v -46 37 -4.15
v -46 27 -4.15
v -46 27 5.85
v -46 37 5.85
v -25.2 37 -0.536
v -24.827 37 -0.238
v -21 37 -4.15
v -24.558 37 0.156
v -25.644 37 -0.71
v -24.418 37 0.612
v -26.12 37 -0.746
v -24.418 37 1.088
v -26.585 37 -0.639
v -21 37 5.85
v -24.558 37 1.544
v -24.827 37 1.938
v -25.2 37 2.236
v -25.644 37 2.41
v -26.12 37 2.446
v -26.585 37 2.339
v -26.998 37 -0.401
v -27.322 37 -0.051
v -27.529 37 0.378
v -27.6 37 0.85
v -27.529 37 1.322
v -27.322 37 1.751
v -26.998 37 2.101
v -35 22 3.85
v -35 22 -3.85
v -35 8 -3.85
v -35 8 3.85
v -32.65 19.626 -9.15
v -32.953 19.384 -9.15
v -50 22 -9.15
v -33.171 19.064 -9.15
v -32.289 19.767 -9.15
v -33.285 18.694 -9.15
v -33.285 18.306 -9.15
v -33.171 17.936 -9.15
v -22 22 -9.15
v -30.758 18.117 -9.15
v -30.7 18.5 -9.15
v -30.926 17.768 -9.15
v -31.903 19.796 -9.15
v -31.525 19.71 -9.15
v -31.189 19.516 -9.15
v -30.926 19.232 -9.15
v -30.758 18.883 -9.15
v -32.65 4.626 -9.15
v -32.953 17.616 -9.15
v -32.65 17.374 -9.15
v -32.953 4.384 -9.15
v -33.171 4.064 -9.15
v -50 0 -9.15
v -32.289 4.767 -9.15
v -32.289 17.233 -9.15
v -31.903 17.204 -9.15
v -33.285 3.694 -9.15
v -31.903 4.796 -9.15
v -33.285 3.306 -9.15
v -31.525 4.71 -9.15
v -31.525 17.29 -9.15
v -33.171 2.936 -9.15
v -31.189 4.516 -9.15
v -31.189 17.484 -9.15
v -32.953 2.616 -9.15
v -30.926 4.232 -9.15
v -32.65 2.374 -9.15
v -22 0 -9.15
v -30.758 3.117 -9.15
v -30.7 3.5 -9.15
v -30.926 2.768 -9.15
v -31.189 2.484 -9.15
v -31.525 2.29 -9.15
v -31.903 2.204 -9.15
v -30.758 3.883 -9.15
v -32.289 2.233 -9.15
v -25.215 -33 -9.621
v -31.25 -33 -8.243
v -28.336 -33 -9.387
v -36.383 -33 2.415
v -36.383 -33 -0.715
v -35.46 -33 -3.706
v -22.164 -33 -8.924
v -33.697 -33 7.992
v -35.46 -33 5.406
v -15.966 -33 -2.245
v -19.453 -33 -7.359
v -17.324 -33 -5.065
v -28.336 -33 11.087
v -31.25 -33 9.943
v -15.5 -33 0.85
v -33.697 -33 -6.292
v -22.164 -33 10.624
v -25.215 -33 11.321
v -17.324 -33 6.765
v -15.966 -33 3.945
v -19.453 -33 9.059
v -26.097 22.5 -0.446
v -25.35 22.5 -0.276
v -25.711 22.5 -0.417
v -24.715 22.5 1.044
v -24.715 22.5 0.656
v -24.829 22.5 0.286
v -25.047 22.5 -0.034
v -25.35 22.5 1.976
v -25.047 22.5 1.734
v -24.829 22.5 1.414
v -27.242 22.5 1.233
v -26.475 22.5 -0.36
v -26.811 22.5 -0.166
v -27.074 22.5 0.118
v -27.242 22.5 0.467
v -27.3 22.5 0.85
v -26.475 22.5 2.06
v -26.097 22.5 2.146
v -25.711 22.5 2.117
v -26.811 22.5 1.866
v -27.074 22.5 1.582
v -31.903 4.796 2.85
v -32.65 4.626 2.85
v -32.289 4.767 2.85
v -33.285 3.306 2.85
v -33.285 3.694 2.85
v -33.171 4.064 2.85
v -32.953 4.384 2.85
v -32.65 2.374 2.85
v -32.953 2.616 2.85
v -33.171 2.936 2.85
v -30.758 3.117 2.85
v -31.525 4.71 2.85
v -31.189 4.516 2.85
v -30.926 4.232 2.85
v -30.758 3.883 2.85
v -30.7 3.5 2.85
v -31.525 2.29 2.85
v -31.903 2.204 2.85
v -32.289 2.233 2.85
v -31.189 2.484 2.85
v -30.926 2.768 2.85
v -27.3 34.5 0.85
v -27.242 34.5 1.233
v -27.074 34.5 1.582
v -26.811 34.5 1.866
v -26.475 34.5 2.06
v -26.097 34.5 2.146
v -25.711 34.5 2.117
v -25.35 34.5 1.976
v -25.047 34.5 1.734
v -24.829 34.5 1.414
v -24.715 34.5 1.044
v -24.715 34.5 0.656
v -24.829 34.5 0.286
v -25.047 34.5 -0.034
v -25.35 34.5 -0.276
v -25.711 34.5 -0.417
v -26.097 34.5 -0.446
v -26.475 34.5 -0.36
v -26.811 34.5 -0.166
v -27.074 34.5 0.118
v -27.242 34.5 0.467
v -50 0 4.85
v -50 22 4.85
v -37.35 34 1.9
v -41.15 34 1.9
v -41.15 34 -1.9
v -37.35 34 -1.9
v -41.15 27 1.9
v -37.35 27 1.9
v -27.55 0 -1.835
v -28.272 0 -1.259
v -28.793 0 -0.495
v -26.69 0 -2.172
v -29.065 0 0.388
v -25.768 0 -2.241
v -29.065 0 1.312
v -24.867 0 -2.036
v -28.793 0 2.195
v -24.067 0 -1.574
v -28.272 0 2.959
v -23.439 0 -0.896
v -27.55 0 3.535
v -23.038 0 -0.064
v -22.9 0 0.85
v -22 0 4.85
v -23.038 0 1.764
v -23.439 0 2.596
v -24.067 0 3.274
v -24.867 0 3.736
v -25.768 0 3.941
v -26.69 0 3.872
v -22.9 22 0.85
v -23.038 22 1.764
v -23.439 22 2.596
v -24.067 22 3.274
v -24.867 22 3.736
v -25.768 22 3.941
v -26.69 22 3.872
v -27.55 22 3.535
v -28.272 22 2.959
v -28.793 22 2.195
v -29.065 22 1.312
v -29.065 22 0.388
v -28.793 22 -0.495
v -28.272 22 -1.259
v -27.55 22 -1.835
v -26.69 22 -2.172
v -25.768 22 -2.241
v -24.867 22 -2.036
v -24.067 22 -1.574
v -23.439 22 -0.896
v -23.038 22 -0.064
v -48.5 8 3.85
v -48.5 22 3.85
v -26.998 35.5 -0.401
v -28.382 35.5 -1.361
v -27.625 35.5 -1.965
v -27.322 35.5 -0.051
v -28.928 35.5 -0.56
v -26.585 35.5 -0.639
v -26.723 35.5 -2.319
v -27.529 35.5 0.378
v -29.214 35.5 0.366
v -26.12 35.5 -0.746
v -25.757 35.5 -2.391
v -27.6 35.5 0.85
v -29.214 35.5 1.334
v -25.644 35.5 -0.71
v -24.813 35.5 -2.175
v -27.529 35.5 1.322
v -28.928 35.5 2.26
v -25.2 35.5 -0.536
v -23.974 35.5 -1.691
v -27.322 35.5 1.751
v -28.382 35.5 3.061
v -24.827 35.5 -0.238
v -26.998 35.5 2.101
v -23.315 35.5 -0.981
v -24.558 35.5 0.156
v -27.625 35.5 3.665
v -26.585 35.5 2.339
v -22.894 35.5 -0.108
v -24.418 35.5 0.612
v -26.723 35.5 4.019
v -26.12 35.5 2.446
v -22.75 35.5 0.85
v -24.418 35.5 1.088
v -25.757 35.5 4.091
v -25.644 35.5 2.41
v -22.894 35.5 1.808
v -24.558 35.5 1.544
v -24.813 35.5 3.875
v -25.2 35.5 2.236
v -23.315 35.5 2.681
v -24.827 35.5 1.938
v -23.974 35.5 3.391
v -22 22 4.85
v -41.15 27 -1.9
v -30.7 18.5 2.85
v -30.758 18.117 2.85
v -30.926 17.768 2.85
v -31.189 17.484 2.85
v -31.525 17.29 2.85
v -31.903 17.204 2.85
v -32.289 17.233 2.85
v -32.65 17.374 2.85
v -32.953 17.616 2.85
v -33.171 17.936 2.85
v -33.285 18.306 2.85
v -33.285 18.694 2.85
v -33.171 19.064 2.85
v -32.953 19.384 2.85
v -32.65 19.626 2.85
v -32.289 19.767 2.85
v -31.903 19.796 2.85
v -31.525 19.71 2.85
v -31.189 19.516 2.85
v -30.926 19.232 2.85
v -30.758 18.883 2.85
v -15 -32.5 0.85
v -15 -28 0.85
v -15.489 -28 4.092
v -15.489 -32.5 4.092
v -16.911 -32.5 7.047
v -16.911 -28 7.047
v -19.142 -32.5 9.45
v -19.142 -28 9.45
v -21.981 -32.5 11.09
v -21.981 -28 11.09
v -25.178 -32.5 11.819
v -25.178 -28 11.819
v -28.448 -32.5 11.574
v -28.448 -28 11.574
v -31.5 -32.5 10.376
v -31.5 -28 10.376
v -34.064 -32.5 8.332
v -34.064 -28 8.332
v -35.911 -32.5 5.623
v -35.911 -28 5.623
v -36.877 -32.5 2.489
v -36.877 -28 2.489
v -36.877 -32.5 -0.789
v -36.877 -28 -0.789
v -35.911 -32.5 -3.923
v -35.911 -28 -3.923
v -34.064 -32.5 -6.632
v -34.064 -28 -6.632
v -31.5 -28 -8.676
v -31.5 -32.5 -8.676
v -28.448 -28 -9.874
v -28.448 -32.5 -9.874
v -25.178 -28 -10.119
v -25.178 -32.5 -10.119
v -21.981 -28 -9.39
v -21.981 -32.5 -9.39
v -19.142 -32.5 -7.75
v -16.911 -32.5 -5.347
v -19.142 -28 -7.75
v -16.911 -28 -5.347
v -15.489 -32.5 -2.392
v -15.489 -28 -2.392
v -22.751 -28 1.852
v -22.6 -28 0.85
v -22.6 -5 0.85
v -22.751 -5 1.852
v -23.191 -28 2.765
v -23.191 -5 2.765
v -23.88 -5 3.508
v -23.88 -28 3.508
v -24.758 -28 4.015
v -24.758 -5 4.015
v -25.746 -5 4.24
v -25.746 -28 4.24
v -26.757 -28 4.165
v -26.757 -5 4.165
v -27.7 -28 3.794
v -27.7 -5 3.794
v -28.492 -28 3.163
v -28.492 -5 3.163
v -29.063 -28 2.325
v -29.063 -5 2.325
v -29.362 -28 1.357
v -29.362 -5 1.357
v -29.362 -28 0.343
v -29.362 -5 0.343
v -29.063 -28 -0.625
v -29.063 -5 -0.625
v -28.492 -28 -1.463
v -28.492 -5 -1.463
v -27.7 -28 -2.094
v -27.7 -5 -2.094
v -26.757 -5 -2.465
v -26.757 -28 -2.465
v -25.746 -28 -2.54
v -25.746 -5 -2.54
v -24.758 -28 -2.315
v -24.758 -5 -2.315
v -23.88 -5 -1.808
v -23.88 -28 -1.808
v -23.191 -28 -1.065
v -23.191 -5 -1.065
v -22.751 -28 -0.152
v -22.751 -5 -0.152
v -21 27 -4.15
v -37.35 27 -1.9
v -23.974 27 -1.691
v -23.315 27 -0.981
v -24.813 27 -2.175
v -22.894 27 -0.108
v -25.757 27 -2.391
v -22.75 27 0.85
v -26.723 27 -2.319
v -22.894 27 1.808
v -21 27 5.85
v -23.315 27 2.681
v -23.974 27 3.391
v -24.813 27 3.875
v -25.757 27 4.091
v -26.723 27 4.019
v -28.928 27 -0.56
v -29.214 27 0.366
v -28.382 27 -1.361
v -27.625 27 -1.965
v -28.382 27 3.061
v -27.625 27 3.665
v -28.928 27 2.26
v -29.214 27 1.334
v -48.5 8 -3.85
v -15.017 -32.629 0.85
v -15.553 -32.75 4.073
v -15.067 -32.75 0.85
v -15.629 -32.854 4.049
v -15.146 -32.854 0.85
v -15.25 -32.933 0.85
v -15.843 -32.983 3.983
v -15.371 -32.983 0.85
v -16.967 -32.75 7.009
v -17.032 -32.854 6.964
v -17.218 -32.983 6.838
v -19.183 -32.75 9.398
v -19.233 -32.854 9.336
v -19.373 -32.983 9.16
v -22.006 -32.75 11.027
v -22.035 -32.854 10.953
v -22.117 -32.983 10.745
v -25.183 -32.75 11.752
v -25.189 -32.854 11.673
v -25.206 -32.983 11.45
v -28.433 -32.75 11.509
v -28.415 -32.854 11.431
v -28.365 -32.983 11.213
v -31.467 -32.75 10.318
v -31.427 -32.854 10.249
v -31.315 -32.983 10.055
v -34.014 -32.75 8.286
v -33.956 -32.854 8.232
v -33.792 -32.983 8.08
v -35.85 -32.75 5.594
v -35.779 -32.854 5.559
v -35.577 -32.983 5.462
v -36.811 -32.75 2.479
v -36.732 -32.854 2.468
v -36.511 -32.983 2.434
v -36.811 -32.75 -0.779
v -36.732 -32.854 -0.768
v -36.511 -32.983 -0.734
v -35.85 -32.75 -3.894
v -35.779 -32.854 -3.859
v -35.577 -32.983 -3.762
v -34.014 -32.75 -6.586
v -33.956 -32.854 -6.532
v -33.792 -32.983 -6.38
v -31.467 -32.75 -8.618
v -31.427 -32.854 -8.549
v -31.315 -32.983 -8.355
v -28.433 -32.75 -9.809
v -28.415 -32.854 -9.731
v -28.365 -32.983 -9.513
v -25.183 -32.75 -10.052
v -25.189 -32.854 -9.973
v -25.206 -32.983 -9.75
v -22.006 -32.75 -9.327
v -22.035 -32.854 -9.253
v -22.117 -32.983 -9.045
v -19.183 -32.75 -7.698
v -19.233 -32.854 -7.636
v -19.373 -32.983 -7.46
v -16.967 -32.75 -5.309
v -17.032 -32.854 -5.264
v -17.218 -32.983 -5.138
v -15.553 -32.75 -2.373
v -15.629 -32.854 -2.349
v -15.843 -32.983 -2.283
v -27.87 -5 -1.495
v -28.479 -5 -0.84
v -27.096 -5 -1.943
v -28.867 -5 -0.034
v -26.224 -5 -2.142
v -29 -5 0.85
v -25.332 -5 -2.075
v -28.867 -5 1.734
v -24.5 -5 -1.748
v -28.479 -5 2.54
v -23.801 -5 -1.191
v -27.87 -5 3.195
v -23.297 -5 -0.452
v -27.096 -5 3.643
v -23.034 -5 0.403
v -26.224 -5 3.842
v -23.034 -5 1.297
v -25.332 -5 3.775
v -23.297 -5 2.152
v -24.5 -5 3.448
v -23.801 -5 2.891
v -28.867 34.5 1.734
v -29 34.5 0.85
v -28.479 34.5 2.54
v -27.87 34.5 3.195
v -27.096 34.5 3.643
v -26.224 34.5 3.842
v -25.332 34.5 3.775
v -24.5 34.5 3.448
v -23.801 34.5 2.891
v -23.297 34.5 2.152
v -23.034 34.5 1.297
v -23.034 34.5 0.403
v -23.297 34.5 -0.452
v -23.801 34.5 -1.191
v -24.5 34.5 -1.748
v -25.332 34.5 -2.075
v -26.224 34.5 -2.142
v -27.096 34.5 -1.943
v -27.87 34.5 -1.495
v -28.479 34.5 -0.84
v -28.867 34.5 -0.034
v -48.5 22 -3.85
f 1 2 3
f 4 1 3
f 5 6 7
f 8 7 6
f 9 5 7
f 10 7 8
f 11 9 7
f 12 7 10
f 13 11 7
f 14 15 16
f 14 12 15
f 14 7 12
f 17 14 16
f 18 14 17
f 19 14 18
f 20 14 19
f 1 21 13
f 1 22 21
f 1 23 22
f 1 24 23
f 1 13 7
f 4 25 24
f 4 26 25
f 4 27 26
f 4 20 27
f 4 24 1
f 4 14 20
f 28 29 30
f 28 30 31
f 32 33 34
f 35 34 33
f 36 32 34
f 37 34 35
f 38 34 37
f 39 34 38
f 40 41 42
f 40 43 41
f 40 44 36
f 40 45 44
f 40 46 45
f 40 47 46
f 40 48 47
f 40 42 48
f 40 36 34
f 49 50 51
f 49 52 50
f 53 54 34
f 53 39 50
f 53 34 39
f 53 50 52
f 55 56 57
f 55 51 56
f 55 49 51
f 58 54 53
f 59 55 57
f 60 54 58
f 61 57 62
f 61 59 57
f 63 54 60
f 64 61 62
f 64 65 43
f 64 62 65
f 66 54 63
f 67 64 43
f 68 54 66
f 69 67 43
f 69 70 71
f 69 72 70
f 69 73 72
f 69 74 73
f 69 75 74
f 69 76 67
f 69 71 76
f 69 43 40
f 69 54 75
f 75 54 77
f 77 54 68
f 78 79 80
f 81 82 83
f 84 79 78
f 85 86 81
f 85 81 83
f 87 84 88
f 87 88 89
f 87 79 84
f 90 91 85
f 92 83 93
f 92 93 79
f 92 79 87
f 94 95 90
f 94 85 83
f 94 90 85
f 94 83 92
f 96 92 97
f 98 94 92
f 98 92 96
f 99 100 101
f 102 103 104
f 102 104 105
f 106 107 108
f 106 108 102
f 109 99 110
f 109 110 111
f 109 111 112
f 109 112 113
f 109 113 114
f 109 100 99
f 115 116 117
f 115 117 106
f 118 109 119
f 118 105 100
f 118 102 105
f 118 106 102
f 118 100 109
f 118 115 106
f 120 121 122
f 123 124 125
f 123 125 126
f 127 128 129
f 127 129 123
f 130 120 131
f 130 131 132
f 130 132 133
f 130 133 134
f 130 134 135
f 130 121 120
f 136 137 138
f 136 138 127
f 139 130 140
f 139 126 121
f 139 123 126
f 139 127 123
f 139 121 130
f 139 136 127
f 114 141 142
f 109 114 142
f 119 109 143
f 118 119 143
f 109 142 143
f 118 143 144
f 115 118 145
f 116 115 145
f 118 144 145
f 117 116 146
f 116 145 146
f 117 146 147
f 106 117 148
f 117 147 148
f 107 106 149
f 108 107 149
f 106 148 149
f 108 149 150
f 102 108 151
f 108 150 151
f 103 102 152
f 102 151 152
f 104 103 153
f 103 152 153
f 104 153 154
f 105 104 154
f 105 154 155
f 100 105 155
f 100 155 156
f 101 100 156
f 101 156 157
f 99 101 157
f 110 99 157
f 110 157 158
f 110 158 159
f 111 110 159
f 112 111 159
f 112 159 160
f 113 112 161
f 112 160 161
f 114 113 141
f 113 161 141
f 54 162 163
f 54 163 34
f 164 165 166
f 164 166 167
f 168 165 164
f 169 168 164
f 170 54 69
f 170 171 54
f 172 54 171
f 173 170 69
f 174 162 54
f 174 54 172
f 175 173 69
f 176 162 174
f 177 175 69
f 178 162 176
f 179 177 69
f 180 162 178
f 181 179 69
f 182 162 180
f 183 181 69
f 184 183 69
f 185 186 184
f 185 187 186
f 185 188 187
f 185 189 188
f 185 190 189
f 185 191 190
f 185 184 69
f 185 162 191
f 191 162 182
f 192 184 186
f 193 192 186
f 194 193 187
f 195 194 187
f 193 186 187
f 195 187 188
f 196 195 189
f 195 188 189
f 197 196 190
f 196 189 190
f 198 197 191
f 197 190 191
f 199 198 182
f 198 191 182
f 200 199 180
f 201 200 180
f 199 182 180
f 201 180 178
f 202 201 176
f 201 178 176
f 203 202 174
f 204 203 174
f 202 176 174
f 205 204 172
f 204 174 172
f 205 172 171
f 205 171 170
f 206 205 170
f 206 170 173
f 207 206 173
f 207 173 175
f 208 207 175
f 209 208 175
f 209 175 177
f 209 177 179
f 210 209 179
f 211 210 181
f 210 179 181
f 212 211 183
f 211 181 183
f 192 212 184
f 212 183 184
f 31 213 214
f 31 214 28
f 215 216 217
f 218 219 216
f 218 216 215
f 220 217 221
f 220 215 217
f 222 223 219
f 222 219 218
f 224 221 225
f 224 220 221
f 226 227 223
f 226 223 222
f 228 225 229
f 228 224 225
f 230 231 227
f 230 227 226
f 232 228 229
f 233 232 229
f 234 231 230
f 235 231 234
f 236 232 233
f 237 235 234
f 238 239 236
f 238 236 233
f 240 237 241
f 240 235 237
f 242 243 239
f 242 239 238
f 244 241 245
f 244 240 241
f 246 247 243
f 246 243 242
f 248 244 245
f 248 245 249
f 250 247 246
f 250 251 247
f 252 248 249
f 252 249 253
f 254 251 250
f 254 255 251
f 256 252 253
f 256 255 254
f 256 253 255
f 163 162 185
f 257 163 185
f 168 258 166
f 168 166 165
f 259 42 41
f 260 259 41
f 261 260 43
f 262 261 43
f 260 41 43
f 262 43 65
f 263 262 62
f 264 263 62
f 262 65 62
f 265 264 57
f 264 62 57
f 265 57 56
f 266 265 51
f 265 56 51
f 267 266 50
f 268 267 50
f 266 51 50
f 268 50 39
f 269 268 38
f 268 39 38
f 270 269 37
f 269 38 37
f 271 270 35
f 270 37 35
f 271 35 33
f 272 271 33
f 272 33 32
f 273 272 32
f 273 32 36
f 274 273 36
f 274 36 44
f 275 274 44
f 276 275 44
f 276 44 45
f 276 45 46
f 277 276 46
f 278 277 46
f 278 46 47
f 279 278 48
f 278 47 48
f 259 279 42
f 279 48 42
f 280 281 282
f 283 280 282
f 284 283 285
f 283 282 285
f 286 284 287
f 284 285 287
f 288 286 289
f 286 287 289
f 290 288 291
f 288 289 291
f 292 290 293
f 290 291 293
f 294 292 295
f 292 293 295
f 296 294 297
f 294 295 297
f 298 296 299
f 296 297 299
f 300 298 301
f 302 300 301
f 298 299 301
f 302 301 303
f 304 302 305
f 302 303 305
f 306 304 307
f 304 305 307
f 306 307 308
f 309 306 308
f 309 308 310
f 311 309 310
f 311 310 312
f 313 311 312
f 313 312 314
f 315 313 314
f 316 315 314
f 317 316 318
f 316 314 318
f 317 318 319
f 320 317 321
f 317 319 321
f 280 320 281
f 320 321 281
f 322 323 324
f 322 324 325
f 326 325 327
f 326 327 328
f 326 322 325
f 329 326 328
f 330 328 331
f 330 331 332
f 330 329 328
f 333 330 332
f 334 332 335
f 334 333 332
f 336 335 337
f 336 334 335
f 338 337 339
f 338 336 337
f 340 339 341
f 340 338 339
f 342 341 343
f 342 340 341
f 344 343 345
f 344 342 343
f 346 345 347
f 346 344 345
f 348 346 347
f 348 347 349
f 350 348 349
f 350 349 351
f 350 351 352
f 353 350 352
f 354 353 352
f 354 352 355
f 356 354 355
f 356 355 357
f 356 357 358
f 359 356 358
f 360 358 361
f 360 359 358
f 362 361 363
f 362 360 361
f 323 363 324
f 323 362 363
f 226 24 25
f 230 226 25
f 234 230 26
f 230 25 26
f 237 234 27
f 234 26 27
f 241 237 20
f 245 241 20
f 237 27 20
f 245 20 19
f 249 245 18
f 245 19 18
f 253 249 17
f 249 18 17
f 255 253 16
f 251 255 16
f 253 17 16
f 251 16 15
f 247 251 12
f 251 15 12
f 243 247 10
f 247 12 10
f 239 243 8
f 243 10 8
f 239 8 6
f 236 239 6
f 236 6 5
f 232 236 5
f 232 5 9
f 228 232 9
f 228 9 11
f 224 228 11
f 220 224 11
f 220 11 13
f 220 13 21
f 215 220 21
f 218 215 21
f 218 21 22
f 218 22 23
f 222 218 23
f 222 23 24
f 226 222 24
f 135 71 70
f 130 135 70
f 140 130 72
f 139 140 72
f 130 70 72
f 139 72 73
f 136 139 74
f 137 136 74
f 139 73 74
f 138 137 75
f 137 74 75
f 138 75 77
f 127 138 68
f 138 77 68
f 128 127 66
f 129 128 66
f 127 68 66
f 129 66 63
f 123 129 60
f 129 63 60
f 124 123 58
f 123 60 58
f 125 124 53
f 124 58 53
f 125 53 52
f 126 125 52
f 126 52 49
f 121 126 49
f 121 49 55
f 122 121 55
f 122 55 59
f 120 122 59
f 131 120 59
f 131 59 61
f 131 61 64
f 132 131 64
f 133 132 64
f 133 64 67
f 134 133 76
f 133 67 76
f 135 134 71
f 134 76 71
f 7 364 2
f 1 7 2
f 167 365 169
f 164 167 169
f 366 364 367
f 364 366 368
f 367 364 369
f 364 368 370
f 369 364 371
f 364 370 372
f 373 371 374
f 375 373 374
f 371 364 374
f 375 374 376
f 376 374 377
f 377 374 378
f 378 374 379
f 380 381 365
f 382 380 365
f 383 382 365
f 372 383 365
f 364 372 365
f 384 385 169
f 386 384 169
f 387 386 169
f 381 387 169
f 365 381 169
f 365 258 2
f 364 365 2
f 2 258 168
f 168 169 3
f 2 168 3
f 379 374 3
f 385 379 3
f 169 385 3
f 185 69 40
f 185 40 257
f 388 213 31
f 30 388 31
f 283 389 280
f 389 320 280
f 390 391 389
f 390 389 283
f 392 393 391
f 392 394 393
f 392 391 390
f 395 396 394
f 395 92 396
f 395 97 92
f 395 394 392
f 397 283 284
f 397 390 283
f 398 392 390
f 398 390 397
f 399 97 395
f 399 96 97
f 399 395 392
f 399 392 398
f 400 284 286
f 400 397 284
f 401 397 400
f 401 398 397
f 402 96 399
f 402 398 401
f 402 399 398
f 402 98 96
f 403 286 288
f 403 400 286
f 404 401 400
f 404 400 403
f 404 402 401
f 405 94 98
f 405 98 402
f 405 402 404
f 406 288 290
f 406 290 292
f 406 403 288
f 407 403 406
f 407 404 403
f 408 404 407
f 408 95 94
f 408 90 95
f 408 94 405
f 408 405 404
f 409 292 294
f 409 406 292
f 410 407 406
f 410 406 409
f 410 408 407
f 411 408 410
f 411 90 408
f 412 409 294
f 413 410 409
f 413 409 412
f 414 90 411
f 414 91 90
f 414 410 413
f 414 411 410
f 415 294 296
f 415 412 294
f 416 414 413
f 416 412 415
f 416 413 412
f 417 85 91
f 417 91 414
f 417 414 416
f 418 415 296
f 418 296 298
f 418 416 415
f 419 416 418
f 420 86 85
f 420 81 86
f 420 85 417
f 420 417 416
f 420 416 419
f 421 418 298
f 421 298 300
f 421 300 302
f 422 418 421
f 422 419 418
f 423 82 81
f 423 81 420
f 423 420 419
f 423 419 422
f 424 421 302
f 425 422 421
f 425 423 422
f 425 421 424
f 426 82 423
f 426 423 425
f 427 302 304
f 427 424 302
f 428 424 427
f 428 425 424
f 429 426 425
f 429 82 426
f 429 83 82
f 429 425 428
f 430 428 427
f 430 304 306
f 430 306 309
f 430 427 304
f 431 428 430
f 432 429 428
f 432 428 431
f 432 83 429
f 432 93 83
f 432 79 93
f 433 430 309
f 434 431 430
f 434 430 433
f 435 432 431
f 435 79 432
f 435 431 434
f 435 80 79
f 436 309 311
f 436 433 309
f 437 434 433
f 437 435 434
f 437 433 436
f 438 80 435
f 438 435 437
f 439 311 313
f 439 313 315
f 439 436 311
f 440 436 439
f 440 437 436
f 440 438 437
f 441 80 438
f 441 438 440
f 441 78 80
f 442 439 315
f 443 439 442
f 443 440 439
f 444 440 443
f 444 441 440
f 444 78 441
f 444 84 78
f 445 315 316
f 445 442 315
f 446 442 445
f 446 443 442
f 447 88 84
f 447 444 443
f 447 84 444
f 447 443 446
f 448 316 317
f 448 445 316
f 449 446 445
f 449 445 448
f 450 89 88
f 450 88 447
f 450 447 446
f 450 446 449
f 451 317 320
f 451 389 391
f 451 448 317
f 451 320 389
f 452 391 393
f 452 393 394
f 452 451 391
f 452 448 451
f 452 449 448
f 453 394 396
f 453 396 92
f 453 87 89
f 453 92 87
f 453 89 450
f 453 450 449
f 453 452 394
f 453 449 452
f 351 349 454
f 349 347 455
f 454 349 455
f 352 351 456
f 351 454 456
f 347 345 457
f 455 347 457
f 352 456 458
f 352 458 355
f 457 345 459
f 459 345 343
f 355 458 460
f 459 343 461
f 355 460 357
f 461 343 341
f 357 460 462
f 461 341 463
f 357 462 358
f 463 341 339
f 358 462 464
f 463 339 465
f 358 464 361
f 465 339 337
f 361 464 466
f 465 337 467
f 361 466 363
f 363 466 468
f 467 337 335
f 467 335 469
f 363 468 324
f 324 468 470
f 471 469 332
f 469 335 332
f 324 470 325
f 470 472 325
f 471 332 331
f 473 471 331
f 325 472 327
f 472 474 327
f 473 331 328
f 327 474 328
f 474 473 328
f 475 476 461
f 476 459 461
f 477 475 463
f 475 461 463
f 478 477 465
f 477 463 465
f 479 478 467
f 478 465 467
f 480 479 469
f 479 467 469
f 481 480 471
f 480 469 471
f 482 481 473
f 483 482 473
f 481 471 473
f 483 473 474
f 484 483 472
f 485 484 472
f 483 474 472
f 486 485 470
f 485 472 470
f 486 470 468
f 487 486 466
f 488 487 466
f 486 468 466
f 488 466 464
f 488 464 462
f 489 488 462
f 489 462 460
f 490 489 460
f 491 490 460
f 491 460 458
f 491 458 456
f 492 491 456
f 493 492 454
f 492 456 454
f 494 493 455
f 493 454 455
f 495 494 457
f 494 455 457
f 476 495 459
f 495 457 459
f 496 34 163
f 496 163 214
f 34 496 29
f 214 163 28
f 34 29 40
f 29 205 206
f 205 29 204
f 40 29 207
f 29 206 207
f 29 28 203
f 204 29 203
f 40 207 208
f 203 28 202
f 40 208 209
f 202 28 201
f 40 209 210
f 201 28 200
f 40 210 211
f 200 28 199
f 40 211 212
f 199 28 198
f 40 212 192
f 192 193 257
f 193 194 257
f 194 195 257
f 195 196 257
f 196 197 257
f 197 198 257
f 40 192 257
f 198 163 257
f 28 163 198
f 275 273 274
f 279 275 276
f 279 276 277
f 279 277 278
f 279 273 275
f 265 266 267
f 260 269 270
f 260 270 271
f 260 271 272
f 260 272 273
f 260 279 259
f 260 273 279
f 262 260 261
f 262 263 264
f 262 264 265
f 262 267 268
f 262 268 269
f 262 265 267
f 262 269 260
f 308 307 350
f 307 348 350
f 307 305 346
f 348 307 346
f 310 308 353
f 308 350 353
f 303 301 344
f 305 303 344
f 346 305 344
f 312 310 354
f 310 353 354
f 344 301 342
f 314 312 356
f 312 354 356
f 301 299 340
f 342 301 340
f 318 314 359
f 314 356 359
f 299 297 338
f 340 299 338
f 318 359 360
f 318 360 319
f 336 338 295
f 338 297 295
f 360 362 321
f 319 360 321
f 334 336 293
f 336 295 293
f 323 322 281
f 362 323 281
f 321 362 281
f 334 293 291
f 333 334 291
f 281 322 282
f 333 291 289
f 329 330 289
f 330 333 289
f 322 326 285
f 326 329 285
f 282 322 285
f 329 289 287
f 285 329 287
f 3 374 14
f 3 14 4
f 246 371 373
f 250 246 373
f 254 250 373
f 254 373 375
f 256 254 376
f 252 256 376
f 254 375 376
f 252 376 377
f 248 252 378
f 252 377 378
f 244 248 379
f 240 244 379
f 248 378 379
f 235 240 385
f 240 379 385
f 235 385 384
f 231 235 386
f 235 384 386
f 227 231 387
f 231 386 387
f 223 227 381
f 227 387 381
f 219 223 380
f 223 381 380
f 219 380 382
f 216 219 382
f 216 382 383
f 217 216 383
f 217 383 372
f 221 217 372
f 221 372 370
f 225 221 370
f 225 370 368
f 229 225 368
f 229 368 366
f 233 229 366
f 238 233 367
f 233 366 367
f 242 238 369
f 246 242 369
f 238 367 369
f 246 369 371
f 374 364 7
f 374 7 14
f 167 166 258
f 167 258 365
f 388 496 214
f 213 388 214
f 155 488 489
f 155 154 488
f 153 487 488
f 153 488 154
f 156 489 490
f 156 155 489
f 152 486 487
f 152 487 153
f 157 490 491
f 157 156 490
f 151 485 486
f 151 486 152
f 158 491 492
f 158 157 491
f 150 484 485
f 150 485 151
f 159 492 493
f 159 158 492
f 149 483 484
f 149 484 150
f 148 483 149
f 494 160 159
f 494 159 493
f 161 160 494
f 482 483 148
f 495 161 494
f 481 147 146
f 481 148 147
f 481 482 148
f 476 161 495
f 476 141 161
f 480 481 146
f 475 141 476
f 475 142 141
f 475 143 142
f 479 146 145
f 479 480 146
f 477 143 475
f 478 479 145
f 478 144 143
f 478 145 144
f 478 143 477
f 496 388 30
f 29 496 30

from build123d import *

# Parameters (mm, degrees)
F0_W      = 28
F0_H      = 4.3
F0_H_2    = 9.7
F0_W_2    = 13.5
F0_H_3    = 7.7
F0_R      = 3.1
F1_DEPTH  = 22
F2_W      = 13.5
F2_H      = 7.7
F3_DEPTH  = 8
F4_R      = 1.3
F5_DEPTH  = 12
F8_R      = 11
F9_DEPTH  = 5
F10_R     = 3
F11_DEPTH = 55
F12_W     = 25
F12_H     = 10
F13_DEPTH = 10
F14_W     = 3.8
F14_H     = 3.8
F15_DEPTH = 7
F14_R     = 3.25
F16_DEPTH = 8.5
F17_R     = 3.4
F18_DEPTH = 23
F19_R     = 3
F20_DEPTH = 7.5
F21_R     = 1.3
F22_DEPTH = 12
F23_R     = 1.6
F24_DEPTH = 25
F25_R     = 0.5


with BuildPart() as f1:
    # F0 (on Front) → F1 (new body)
    with BuildSketch(Plane.XZ):
        with Locations((-36, -7)):
            Rectangle(F0_W, F0_H)
        with Locations((-36, 0)):
            Rectangle(F0_W, F0_H_2)
        with Locations((-41.75, 0)):
            Rectangle(F0_W_2, F0_H_3, mode=Mode.SUBTRACT)
        with Locations((-26, 0.85)):
            Circle(F0_R, mode=Mode.SUBTRACT)
    extrude(amount=-F1_DEPTH)

    # F2 (on face) → F3 (join)
    with BuildSketch(Plane.XZ):
        with Locations((-41.75, 0)):
            Rectangle(F2_W, F2_H)
    extrude(amount=-F3_DEPTH)

    # F4 (on face) → F5 (cut)
    with BuildSketch(Plane(origin=(0, 0, -9.15), x_dir=(1, 0, 0), z_dir=(0, 0, -1))):
        with Locations((-32, -3.5)):
            Circle(F4_R)
        with Locations((-32, -18.5)):
            Circle(F4_R)
    extrude(amount=-F5_DEPTH, mode=Mode.SUBTRACT)


with BuildPart() as f9:
    # F8 (on offset) → F9 (new body)
    with BuildSketch(Plane.XZ.offset(28)):
        with Locations((-26, 0.85)):
            Circle(F8_R)
    extrude(amount=F9_DEPTH)

    # F10 (on face) → F11 (join)
    with BuildSketch(Plane(origin=(0, -28, 0), x_dir=(-1, 0, 0), z_dir=(0, 1, 0))):
        with Locations((26, 0.85)):
            Circle(F10_R)
    extrude(amount=F11_DEPTH)

    # F17 (on face) → F18 (join)
    with BuildSketch(Plane.XZ.offset(28)):
        with Locations((-26, 0.85)):
            Circle(F17_R)
    extrude(amount=-F18_DEPTH)

    # F19 (on face) → F20 (join)
    with BuildSketch(Plane(origin=(0, 27, 0), x_dir=(-1, 0, 0), z_dir=(0, 1, 0))):
        with Locations((26, 0.85)):
            Circle(F19_R)
    extrude(amount=F20_DEPTH)

    # F21 (on face) → F22 (cut)
    with BuildSketch(Plane(origin=(0, 34.5, 0), x_dir=(-1, 0, 0), z_dir=(0, 1, 0))):
        with Locations((26, 0.85)):
            Circle(F21_R)
    extrude(amount=-F22_DEPTH, mode=Mode.SUBTRACT)

    # F25
    f25_edges = [f9.edges().sort_by_distance(p)[0] for p in [
        (-37, -33, 0.85),
    ]]
    fillet(f25_edges, radius=F25_R)


with BuildPart() as f13:
    # F12 (on offset) → F13 (new body)
    with BuildSketch(Plane(origin=(0, 27, 0), x_dir=(-1, 0, 0), z_dir=(0, 1, 0))):
        with Locations((33.5, 0.85)):
            Rectangle(F12_W, F12_H)
    extrude(amount=F13_DEPTH)

    # F14 (on face) → F15 (cut)
    with BuildSketch(Plane.XZ.offset(-27)):
        with Locations((-39.25, 0)):
            Rectangle(F14_W, F14_H)
    extrude(amount=-F15_DEPTH, mode=Mode.SUBTRACT)

    # F14 (on face) → F16 (cut)
    with BuildSketch(Plane.XZ.offset(-27)):
        with Locations((-26, 0.85)):
            Circle(F14_R)
    extrude(amount=-F16_DEPTH, mode=Mode.SUBTRACT)

    # F23 (on face) → F24 (cut)
    with BuildSketch(Plane(origin=(0, 37, 0), x_dir=(-1, 0, 0), z_dir=(0, 1, 0))):
        with Locations((26, 0.85)):
            Circle(F23_R)
    extrude(amount=-F24_DEPTH, mode=Mode.SUBTRACT)


solid = Compound([f1.part, f9.part, f13.part])
